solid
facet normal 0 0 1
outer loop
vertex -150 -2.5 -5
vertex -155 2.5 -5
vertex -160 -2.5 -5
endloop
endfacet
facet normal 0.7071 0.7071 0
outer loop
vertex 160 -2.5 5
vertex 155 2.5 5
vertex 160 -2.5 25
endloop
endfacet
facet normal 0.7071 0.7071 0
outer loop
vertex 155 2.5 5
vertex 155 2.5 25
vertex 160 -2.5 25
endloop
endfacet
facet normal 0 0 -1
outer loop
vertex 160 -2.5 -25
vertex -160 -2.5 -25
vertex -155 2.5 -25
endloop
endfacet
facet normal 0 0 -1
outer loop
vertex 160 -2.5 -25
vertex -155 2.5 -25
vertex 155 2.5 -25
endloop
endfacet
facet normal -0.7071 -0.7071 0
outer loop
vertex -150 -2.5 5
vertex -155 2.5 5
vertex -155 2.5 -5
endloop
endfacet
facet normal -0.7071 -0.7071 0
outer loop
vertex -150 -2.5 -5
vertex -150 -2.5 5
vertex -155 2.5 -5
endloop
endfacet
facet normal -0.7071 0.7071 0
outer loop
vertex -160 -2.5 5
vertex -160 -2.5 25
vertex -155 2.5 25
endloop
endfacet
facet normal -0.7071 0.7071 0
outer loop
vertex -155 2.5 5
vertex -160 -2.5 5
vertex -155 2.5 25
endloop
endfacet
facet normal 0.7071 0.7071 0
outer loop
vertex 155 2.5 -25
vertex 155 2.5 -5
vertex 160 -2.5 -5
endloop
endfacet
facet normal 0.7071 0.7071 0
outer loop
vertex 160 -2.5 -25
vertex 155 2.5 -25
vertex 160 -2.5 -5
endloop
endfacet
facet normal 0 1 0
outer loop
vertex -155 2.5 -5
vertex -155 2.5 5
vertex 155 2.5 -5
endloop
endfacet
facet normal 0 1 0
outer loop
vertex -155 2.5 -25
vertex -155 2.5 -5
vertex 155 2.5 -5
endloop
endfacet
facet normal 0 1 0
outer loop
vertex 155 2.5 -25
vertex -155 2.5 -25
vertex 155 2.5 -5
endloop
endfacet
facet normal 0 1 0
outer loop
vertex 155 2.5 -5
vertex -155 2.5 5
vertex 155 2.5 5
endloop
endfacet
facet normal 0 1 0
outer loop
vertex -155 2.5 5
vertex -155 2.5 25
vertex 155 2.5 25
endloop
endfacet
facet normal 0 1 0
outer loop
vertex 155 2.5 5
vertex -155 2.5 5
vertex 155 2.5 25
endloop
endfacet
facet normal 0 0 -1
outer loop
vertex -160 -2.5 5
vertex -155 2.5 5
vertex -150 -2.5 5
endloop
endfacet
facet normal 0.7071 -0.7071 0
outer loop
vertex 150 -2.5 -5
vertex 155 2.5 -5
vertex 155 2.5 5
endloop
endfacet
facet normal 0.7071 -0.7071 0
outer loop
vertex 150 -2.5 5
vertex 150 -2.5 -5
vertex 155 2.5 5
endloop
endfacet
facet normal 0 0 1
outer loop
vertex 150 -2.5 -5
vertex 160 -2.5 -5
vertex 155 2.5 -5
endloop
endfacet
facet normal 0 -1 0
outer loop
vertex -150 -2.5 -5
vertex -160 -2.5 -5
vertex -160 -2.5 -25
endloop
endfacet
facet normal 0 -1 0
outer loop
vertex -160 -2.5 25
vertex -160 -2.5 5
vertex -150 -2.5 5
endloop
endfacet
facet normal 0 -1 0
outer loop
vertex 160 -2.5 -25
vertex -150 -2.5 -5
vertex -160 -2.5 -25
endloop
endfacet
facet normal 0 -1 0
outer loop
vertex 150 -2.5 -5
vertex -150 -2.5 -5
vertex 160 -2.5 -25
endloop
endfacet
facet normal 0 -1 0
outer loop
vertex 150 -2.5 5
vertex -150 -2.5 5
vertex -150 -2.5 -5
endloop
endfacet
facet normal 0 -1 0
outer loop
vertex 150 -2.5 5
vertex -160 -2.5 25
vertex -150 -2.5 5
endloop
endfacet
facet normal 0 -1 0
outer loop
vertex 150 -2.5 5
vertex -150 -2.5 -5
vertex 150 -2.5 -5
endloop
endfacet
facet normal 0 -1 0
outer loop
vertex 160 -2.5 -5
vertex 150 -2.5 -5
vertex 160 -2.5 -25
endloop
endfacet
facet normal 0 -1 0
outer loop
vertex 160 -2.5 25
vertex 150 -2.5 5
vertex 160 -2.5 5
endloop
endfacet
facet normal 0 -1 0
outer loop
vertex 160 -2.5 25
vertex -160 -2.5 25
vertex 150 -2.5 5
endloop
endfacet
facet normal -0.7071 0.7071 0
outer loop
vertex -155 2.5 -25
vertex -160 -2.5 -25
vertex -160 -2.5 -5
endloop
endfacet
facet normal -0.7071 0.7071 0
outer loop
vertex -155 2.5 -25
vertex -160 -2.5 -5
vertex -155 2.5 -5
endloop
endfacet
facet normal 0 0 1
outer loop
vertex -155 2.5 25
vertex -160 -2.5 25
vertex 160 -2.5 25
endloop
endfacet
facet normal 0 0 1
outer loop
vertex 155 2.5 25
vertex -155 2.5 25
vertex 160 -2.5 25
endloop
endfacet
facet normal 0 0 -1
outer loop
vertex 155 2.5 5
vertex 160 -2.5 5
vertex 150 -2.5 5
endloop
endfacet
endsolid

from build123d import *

# Parameters (mm, degrees)
F0_W     = 320
F0_H     = 50
F1_DEPTH = 2.5
F3_DEPTH = 50
F5_DEPTH = 60
F6_W     = 7.071068
F6_H     = 5
F7_DEPTH = 25
F8_W     = 7.071068
F8_H     = 5
F9_DEPTH = 25


with BuildPart() as f1:
    # F0 (on Front) → F1 (new body, symmetric)
    with BuildSketch(Plane.XZ):
        Rectangle(F0_W, F0_H)
    extrude(amount=F1_DEPTH, both=True)

    # F2 (on face) → F3 (cut)
    with BuildSketch(Plane.XY.offset(25)):
        Polygon((155, 2.5), (160, -2.5), (160, 2.5), align=None)
    extrude(amount=-F3_DEPTH, mode=Mode.SUBTRACT)

    # F4 (on face) → F5 (cut)
    with BuildSketch(Plane.XY.offset(25)):
        Polygon((-155, 2.5), (-160, 2.5), (-160, -2.5), align=None)
    extrude(amount=-F5_DEPTH, mode=Mode.SUBTRACT)

    # F6 (on face) → F7 (cut)
    with BuildSketch(Plane(origin=(78.75, 78.75, 0), x_dir=(-0.707107, 0.707107, 0), z_dir=(0.707107, 0.707107, 0))):
        with Locations((-111.369318, -2.5)):
            Rectangle(F6_W, F6_H)
        with Locations((-111.369318, 2.5)):
            Rectangle(F6_W, F6_H)
    extrude(amount=-F7_DEPTH, mode=Mode.SUBTRACT)

    # F8 (on face) → F9 (cut)
    with BuildSketch(Plane(origin=(-78.75, 78.75, 0), x_dir=(-0.707107, -0.707107, 0), z_dir=(-0.707107, 0.707107, 0))):
        with Locations((111.369318, -2.5)):
            Rectangle(F8_W, F8_H)
        with Locations((111.369318, 2.5)):
            Rectangle(F8_W, F8_H)
    extrude(amount=-F9_DEPTH, mode=Mode.SUBTRACT)


solid = f1.part
